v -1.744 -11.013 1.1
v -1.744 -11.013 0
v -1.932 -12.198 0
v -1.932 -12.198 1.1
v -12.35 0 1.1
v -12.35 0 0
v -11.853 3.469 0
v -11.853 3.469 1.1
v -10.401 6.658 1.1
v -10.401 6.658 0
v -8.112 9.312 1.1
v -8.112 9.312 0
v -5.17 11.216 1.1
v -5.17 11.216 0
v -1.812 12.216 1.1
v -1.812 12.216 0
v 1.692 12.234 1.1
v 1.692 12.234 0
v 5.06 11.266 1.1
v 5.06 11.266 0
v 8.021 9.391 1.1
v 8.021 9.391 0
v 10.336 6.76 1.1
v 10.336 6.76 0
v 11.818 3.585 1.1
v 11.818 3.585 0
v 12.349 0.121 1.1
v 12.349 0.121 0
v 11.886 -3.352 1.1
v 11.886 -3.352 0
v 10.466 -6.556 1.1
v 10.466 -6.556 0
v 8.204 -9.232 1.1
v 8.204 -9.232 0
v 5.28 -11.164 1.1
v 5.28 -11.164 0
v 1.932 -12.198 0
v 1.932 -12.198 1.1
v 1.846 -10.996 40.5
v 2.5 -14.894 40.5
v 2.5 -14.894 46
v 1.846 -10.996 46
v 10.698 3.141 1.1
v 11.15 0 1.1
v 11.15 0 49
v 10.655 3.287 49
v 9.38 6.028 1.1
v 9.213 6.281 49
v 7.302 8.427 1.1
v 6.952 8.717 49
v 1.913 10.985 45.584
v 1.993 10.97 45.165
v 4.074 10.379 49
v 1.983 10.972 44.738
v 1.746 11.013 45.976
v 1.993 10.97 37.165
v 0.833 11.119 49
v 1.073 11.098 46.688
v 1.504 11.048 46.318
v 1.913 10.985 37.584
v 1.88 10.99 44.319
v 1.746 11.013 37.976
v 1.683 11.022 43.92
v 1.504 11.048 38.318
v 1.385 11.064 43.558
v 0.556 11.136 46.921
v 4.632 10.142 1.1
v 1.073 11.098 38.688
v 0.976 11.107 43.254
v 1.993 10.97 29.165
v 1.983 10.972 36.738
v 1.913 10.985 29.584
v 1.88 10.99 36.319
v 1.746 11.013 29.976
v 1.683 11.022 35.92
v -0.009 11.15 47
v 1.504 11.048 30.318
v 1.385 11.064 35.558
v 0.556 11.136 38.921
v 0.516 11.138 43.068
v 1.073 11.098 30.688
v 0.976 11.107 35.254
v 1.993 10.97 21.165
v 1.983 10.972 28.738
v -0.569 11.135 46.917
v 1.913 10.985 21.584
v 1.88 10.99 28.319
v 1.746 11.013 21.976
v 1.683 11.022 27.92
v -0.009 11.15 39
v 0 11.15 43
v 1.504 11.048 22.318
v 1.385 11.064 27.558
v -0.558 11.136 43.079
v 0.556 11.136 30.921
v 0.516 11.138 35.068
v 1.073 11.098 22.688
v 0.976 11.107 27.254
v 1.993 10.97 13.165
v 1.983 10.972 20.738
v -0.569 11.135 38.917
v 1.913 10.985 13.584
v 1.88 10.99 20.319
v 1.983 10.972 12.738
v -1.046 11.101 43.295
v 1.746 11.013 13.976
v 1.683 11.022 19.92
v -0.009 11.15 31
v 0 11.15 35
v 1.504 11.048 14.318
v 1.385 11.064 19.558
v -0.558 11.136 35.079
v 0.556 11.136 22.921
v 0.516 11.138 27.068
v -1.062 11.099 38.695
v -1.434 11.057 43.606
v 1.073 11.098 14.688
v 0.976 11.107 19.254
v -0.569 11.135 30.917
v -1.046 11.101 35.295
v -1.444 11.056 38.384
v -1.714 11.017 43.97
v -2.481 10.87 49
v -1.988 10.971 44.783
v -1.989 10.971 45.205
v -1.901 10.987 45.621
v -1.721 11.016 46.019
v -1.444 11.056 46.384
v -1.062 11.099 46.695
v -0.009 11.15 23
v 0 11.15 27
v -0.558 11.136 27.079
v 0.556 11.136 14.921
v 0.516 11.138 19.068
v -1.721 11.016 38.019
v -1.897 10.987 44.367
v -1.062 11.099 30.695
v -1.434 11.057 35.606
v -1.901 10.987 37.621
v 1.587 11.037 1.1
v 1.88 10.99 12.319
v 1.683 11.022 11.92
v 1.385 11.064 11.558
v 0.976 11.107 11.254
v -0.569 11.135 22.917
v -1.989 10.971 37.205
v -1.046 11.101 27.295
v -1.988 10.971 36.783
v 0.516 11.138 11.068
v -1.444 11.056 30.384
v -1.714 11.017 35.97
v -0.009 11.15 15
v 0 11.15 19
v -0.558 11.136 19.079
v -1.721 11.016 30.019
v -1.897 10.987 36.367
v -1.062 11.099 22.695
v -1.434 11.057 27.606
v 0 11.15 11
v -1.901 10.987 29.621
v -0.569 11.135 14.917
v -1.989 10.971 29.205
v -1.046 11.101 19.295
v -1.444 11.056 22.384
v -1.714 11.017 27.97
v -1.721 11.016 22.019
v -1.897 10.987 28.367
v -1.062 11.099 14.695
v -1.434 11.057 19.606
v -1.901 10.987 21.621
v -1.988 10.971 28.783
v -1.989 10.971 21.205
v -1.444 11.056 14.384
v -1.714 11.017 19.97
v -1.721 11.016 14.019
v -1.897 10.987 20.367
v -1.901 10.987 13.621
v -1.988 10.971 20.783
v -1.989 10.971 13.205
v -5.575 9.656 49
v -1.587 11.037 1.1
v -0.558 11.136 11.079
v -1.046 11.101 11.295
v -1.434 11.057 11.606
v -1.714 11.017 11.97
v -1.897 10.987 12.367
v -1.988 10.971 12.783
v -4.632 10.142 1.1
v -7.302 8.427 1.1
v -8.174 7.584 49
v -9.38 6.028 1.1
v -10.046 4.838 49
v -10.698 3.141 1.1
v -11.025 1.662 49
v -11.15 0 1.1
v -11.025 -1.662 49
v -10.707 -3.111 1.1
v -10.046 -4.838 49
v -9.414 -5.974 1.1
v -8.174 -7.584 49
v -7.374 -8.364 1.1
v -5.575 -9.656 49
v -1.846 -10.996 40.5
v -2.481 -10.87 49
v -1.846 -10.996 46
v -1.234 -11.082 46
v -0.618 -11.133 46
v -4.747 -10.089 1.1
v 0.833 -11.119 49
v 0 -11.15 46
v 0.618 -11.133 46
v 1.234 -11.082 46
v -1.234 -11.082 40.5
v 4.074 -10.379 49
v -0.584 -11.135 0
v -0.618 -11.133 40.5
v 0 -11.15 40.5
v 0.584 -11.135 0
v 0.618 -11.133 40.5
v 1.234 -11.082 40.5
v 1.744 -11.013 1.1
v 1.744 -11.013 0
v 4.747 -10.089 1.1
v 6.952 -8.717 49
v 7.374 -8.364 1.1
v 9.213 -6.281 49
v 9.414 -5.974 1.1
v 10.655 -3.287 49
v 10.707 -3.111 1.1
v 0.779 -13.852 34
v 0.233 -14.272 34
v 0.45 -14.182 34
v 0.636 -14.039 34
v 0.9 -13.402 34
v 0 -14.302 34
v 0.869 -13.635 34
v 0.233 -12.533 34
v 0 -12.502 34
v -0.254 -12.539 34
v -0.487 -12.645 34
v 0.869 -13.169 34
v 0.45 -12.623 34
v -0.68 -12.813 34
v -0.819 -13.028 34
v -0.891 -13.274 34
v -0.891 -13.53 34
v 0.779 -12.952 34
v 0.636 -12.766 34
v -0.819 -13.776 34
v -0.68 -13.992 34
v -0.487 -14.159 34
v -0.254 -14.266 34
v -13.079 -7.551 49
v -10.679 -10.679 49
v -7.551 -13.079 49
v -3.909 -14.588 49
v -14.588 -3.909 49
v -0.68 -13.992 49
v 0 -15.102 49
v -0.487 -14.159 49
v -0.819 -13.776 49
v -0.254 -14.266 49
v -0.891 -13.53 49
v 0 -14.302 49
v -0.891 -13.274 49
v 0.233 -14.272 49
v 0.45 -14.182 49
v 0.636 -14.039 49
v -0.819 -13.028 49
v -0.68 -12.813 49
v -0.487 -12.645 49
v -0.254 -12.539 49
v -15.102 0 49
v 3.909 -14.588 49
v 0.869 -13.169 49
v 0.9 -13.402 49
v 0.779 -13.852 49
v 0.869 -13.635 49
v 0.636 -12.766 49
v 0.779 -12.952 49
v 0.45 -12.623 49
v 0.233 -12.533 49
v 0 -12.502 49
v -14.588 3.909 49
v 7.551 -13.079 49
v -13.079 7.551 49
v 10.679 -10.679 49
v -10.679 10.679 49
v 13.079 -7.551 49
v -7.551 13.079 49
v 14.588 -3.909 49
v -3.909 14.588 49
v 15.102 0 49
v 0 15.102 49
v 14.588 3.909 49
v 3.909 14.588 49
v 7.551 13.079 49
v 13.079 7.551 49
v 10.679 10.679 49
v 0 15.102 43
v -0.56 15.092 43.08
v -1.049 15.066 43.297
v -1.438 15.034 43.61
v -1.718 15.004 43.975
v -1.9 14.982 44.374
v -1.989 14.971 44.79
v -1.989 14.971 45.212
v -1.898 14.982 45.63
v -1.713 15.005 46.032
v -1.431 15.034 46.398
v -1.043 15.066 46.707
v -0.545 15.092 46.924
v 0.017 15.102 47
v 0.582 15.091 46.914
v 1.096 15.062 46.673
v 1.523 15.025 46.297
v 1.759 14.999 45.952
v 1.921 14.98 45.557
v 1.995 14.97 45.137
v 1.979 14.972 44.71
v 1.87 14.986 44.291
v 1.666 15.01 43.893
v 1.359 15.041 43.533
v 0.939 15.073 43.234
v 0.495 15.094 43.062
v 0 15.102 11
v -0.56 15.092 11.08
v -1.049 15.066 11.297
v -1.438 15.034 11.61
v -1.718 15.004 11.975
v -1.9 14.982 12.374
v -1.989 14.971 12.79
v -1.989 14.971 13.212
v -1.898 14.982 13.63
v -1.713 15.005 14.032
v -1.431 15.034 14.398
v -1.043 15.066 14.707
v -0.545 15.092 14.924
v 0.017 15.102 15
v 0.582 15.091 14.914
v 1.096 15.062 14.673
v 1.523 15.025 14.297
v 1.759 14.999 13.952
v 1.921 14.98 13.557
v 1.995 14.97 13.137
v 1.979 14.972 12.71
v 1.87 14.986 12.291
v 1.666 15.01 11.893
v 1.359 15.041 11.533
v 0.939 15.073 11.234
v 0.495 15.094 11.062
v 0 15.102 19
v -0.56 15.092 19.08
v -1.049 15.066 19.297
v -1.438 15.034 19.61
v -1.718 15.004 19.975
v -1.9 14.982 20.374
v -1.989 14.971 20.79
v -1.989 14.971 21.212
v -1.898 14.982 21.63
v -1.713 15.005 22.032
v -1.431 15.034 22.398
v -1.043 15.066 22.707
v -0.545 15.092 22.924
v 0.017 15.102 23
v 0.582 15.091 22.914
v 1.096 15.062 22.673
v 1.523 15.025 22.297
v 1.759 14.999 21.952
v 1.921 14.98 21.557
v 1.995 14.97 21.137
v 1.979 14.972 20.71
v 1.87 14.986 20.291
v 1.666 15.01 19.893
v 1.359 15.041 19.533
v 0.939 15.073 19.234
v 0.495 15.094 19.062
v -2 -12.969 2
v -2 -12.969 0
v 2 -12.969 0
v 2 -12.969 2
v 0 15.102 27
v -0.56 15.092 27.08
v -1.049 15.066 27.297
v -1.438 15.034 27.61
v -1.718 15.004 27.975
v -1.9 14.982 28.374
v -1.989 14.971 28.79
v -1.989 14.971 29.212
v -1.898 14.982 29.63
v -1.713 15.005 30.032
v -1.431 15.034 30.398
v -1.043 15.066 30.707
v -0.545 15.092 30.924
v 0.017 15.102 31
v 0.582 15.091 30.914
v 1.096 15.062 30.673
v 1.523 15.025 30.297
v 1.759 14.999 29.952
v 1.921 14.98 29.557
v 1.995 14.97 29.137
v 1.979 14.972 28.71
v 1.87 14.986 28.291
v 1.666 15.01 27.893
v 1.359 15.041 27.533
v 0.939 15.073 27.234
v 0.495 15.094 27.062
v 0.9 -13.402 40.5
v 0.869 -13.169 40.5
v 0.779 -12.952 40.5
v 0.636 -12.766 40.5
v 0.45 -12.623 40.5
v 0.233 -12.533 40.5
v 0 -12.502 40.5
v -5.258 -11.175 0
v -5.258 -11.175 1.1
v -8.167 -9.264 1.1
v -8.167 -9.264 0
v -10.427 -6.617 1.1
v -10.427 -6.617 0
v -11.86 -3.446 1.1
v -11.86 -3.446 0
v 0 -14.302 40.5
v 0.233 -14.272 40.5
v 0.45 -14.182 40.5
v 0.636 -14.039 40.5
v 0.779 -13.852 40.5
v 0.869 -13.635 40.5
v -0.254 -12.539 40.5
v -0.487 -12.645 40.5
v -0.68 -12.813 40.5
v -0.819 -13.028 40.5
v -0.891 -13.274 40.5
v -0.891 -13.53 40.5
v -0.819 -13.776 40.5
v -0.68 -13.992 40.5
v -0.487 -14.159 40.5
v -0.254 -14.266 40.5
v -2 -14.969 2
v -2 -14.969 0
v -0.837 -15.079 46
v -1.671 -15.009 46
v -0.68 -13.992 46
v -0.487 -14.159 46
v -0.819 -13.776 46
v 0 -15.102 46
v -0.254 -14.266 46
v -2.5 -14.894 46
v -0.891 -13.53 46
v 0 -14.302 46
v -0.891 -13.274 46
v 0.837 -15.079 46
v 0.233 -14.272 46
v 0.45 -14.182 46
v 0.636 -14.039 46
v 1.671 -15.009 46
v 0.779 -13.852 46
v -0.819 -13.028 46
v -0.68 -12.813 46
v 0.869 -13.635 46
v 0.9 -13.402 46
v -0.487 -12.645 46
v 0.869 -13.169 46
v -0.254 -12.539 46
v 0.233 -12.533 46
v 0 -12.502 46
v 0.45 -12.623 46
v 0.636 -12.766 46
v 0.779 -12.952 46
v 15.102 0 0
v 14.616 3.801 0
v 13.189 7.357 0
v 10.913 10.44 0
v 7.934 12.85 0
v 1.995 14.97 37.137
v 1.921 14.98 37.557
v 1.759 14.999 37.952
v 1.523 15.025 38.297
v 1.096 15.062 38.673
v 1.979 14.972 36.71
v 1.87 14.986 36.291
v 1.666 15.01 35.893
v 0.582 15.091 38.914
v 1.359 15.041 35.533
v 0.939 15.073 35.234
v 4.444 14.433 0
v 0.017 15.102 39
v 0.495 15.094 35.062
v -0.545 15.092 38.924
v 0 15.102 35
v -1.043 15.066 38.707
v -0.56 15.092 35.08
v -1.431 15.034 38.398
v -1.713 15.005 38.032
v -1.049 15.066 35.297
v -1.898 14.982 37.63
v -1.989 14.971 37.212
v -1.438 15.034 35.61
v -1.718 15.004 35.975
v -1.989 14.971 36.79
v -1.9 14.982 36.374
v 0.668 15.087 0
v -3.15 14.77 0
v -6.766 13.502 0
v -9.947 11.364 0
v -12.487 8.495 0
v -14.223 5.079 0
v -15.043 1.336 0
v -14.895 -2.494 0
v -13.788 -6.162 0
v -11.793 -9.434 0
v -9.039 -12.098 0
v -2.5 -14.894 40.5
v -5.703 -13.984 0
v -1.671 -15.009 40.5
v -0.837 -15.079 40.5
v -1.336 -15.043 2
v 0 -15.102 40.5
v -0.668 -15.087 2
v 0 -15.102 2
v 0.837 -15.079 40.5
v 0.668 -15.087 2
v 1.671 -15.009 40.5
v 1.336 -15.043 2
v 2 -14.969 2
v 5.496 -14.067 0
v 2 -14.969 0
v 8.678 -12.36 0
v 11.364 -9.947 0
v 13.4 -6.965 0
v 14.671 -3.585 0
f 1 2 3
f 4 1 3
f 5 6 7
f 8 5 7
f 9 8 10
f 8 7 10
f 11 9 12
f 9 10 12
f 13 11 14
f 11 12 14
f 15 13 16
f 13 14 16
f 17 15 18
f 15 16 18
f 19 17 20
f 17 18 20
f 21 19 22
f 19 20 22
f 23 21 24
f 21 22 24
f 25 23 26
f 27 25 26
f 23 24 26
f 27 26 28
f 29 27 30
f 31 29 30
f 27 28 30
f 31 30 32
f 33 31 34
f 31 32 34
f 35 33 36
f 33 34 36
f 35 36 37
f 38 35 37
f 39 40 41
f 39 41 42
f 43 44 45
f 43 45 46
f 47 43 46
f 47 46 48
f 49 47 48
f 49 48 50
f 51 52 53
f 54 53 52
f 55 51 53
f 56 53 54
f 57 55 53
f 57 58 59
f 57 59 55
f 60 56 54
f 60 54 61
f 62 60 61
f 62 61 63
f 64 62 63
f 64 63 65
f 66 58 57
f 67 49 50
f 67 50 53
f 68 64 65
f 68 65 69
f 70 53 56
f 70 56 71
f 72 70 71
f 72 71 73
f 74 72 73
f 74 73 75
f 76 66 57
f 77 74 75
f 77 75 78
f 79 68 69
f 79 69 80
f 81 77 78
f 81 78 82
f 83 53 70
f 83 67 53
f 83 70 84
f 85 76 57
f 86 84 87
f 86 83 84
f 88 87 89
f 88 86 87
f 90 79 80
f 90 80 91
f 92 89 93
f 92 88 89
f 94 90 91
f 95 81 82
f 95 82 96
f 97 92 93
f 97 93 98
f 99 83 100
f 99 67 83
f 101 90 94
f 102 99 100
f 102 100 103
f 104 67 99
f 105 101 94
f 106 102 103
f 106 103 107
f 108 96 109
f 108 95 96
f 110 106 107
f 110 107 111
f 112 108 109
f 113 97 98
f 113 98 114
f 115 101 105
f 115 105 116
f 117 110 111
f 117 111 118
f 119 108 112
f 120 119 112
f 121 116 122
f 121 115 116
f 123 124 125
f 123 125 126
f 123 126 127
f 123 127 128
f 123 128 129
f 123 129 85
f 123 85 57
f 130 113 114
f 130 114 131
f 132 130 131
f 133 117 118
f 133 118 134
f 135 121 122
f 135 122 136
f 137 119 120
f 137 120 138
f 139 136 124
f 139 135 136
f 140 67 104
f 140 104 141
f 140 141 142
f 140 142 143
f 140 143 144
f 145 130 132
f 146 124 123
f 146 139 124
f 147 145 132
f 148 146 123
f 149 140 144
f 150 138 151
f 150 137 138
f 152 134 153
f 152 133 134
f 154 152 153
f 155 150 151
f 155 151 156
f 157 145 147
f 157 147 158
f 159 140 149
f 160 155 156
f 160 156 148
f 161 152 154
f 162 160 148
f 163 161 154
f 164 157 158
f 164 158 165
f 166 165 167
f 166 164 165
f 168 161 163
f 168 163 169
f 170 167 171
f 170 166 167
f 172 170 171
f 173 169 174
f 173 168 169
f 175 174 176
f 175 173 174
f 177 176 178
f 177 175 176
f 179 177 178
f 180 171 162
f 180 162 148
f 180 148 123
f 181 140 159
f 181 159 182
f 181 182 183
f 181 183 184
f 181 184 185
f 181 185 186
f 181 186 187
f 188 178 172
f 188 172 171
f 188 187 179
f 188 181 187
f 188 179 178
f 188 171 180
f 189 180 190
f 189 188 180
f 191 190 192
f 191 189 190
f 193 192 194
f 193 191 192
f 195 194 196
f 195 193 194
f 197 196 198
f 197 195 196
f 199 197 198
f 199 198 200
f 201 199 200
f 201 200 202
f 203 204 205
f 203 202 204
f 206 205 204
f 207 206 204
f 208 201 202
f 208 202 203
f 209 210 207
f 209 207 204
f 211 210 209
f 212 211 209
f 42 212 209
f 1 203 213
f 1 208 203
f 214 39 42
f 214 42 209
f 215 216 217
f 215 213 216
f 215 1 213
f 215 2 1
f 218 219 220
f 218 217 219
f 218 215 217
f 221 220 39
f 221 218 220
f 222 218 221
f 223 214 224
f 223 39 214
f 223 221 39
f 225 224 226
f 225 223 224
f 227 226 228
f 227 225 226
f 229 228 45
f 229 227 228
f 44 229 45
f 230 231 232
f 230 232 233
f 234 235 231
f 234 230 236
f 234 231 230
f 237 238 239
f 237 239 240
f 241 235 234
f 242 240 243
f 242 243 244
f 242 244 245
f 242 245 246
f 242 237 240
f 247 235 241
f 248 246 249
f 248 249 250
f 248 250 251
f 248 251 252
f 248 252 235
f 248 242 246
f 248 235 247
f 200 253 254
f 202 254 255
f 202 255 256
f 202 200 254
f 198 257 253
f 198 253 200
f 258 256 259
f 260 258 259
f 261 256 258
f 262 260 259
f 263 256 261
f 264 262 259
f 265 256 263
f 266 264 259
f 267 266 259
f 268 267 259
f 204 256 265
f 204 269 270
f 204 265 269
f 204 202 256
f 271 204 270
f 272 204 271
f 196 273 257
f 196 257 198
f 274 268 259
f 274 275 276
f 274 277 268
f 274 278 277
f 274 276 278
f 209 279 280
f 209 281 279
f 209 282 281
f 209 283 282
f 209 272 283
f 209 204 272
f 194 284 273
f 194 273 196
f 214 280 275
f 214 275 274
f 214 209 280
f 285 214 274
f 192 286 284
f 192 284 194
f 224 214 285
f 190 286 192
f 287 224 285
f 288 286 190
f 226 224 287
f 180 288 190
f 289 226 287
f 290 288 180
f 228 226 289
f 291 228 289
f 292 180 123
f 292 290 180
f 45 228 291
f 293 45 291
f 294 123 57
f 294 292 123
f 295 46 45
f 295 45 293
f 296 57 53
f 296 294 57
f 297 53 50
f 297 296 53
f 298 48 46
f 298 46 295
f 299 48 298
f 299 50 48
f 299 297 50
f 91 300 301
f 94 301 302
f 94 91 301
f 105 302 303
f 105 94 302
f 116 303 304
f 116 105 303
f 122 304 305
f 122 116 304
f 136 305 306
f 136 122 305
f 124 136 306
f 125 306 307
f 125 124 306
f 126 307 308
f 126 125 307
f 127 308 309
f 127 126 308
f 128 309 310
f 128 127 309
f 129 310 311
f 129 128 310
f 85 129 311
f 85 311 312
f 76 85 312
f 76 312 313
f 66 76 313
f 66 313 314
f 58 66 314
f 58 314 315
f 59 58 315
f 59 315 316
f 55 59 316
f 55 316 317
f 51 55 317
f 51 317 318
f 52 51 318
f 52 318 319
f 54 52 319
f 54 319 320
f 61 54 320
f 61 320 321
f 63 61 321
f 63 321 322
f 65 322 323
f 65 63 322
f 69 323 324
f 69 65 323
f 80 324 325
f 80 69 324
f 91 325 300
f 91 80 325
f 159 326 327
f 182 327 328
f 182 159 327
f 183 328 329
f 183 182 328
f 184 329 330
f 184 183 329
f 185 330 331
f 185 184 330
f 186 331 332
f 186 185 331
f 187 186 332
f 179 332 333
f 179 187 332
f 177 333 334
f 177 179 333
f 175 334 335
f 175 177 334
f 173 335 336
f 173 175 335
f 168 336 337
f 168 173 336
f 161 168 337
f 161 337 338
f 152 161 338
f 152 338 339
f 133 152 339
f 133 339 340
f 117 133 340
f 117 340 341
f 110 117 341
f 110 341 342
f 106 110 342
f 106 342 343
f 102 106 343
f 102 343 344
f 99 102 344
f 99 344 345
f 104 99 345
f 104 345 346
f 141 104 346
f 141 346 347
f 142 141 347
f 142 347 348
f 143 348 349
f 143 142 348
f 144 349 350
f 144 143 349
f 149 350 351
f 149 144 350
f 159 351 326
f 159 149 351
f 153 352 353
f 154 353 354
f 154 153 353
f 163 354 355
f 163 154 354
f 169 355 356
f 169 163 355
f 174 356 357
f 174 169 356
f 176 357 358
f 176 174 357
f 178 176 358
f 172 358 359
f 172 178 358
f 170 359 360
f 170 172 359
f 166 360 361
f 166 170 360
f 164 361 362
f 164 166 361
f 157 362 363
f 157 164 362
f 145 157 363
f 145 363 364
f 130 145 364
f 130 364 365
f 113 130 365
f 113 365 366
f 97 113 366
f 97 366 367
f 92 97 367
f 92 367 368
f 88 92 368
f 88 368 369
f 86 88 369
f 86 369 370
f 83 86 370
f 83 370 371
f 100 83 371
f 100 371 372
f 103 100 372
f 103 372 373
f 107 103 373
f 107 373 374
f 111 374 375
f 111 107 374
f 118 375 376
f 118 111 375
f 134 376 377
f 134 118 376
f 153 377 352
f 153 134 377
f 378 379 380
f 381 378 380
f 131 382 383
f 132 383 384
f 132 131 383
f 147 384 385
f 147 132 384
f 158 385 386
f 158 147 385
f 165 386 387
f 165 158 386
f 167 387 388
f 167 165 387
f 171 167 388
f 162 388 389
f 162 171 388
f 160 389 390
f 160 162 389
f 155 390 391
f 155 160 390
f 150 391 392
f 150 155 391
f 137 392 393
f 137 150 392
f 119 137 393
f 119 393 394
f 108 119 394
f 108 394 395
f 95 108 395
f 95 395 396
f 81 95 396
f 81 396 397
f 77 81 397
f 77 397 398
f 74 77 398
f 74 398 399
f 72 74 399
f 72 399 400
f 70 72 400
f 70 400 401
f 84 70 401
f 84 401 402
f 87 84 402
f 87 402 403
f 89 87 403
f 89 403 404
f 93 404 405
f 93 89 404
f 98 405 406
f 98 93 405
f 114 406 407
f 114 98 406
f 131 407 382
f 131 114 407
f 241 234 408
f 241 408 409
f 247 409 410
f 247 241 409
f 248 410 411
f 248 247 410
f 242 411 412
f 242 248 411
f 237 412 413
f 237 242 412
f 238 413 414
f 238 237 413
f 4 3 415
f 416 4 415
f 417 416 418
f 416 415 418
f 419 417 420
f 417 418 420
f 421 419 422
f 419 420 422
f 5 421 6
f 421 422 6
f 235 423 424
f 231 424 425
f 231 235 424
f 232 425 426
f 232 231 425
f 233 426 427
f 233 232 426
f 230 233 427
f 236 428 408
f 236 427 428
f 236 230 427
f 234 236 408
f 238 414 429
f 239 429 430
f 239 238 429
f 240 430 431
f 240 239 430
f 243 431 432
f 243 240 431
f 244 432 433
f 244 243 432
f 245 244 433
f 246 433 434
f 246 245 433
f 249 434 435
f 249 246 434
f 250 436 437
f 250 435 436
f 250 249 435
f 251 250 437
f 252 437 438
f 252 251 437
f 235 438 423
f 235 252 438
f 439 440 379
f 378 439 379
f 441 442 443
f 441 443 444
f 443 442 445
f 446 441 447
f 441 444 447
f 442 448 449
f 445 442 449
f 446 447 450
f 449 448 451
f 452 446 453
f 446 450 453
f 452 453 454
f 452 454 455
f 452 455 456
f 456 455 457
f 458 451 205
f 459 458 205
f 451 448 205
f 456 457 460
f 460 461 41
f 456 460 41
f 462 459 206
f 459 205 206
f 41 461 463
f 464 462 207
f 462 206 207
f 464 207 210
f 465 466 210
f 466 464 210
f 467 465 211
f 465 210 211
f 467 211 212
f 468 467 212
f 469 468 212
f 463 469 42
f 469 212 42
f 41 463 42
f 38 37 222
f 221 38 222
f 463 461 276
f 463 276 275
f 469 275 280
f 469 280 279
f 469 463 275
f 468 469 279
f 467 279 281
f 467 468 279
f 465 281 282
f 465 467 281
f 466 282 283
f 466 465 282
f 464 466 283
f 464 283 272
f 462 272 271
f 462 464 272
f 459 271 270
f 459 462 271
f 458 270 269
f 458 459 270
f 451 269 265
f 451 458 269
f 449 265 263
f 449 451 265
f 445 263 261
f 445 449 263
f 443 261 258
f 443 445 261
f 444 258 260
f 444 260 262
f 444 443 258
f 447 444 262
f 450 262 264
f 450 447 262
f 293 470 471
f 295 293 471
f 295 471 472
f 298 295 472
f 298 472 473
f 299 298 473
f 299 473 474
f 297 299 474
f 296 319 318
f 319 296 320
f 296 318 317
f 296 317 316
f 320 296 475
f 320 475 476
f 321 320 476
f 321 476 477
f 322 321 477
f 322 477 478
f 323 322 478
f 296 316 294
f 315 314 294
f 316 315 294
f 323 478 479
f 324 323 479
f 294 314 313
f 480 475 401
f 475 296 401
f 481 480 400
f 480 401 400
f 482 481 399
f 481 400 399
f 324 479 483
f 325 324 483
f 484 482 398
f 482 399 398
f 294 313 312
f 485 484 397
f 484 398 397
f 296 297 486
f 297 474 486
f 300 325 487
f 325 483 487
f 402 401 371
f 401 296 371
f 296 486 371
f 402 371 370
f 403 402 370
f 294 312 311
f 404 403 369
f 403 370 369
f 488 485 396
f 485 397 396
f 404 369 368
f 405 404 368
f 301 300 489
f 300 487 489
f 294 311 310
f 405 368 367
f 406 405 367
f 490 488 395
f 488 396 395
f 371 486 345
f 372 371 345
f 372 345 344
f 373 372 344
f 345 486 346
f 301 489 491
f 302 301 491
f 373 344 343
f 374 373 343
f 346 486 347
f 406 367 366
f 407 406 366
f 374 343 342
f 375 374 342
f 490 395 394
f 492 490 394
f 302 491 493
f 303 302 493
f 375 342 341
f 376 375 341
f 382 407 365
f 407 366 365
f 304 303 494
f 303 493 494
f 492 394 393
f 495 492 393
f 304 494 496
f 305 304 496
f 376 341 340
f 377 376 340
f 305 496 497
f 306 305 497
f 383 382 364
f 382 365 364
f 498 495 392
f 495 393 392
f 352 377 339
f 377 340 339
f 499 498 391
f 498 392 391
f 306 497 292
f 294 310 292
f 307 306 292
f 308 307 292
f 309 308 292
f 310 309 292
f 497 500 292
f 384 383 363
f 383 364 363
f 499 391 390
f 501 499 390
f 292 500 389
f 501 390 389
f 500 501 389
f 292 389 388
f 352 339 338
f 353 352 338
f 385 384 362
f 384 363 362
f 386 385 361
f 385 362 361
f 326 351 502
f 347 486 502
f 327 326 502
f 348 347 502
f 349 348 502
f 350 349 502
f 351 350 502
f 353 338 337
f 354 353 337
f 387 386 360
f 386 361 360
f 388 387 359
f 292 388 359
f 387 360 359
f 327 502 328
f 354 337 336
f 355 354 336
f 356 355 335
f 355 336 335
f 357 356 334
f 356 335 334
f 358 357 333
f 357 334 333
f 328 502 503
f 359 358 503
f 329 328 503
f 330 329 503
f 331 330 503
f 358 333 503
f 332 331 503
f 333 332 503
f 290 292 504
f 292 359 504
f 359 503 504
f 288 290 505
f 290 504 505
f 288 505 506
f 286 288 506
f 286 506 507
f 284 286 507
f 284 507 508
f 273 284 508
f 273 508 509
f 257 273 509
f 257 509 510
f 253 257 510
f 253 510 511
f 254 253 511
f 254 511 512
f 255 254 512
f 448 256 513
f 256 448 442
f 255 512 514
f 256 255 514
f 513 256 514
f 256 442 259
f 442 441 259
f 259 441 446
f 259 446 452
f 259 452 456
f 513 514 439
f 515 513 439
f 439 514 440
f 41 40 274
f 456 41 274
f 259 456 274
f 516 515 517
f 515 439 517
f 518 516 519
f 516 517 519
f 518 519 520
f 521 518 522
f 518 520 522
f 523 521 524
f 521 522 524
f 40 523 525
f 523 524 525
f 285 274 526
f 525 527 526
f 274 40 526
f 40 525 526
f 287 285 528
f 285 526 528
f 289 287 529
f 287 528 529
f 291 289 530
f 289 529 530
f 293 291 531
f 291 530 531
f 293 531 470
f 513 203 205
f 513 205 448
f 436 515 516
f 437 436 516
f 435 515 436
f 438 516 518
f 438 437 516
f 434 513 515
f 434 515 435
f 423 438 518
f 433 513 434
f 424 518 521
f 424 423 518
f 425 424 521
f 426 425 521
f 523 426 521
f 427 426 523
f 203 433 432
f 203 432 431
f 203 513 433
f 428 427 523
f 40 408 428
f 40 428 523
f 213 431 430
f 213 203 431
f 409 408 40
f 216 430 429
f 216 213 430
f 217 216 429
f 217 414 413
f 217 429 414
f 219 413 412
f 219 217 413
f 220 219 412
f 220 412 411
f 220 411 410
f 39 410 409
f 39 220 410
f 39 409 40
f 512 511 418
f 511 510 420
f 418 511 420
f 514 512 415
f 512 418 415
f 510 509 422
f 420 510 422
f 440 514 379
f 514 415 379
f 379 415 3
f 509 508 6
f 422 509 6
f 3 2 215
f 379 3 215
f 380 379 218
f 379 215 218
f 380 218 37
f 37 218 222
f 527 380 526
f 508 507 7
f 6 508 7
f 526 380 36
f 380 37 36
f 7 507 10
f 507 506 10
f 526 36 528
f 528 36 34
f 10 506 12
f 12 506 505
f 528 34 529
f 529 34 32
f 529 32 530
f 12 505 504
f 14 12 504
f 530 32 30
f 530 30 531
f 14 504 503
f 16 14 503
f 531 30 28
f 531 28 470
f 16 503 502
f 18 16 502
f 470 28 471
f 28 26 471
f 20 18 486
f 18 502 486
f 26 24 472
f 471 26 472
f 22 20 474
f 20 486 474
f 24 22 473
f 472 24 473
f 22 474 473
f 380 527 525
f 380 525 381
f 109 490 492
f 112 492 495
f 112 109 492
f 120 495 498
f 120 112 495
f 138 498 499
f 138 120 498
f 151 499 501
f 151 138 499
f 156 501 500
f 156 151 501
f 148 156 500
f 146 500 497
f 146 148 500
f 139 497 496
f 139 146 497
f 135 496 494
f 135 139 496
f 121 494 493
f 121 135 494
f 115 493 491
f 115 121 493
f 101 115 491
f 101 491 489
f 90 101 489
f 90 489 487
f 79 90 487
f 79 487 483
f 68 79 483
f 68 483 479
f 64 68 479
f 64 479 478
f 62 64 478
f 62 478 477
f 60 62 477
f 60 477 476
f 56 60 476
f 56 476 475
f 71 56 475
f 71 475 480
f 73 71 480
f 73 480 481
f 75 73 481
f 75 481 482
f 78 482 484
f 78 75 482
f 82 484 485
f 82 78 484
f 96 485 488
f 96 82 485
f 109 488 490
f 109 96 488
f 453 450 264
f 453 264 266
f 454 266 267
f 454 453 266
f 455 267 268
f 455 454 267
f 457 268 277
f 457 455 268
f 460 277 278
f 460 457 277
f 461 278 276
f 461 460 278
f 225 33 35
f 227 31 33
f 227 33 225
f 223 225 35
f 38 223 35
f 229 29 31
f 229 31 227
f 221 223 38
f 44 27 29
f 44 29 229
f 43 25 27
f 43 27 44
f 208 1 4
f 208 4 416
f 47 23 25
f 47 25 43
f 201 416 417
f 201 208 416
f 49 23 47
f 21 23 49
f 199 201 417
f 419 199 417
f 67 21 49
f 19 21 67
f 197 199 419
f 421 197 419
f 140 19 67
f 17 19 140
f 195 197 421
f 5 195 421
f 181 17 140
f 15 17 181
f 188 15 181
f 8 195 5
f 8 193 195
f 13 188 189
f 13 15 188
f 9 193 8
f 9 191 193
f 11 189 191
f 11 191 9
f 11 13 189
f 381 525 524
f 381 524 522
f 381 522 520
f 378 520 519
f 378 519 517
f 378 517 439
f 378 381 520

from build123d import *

# Parameters (mm, degrees)
SKETCH1_R           = 15.102178337
SKETCH1_R_2         = 11.15
BOSS_EXTRUDE1_DEPTH = 49
SKETCH2_W           = 2
SKETCH2_H           = 2
CUT_EXTRUDE1_DEPTH  = 2
CUT_EXTRUDE2_DEPTH  = 1.1
SKETCH7_R           = 2
PIN_HOLE_DEPTH      = 54.452329987
CUT_EXTRUDE4_START  = -8.5
CUT_EXTRUDE4_DEPTH  = 5.5
CUT_EXTRUDE5_START  = -15
CUT_EXTRUDE5_DEPTH  = 15


with BuildPart() as part:
    # Sketch1 → Boss-Extrude1 (new body)
    with BuildSketch(Plane.XY):
        Circle(SKETCH1_R)
        Circle(SKETCH1_R_2, mode=Mode.SUBTRACT)
    extrude(amount=BOSS_EXTRUDE1_DEPTH)

    # Sketch2 → Cut-Extrude1 (cut)
    with BuildSketch(Plane(origin=(0, 0, 0), x_dir=(-1, 0, 0), z_dir=(0, 0, -1))):
        with BuildLine():
            Line((2, -14.969161317), (0, -14.969161317))
            Line((0, -14.969161317), (0, -15.102178337))
            ThreePointArc((0, -15.102178337), (1.002209251, -15.068887389), (2, -14.969161317))
        make_face()
        with BuildLine():
            Line((0, -15.102178337), (0, -14.969161317))
            Line((0, -14.969161317), (-2, -14.969161317))
            ThreePointArc((-2, -14.969161317), (-1.002209251, -15.068887389), (0, -15.102178337))
        make_face()
        with Locations((1, -13.969161317)):
            Rectangle(SKETCH2_W, SKETCH2_H)
        with Locations((-1, -13.969161317)):
            Rectangle(SKETCH2_W, SKETCH2_H)
    extrude(amount=-CUT_EXTRUDE1_DEPTH, mode=Mode.SUBTRACT)

    # Sketch6 → Cut-Extrude2 (cut)
    with BuildSketch(Plane(origin=(0, 0, 0), x_dir=(-1, 0, 0), z_dir=(0, 0, -1))):
        with BuildLine():
            Line((-1.931965643, -12.197951006), (-1.744244285, -11.012724998))
            ThreePointArc((-1.744244285, -11.012724998), (-7.241345739, 8.478526516), (11.15, 0))
            ThreePointArc((11.15, 0), (8.478526516, -7.241345739), (1.744244285, -11.012724998))
            Line((1.744244285, -11.012724998), (1.931965643, -12.197951006))
            ThreePointArc((1.931965643, -12.197951006), (9.391013675, -8.020683397), (12.35, 0))
            ThreePointArc((12.35, 0), (-8.020683397, 9.391013675), (-1.931965643, -12.197951006))
        make_face()
    extrude(amount=-CUT_EXTRUDE2_DEPTH, mode=Mode.SUBTRACT)

    # Sketch7 → Pin hole (cut, through all)
    with BuildSketch(Plane(origin=(0, 0, 0), x_dir=(1, 0, 0), z_dir=(0, 1, 0))):
        with Locations(Location((0, -13, 0), (0, 0, 90))):
            Circle(SKETCH7_R)
        with Locations(Location((0, -21, 0), (0, 0, 90))):
            Circle(SKETCH7_R)
        with Locations(Location((0, -29, 0), (0, 0, 90))):
            Circle(SKETCH7_R)
        with Locations(Location((0, -37, 0), (0, 0, 90))):
            Circle(SKETCH7_R)
        with Locations(Location((0, -45, 0), (0, 0, 90))):
            Circle(SKETCH7_R)
    extrude(amount=PIN_HOLE_DEPTH, mode=Mode.SUBTRACT)

    # Sketch8 → Cut-Extrude4 (cut)
    with BuildSketch(Plane.XY.offset(49).offset(CUT_EXTRUDE4_START)):
        with BuildLine():
            Line((2.5, -14.893817192), (1.845760219, -10.996166114))
            ThreePointArc((1.845760219, -10.996166114), (0.926079863, -11.111474974), (0, -11.15))
            Line((0, -11.15), (0, -12.502178337))
            ThreePointArc((0, -12.502178337), (0.636396103, -12.765782234), (0.9, -13.402178337))
            ThreePointArc((0.9, -13.402178337), (0.636396103, -14.038574441), (0, -14.302178337))
            Line((0, -14.302178337), (0, -15.102178337))
            ThreePointArc((0, -15.102178337), (1.254333924, -15.049997905), (2.5, -14.893817192))
        make_face()
        with BuildLine():
            ThreePointArc((0, -11.15), (-0.926079863, -11.111474974), (-1.845760219, -10.996166114))
            Line((-1.845760219, -10.996166114), (-2.5, -14.893817192))
            ThreePointArc((-2.5, -14.893817192), (-1.254333924, -15.049997905), (0, -15.102178337))
            Line((0, -15.102178337), (0, -14.302178337))
            ThreePointArc((0, -14.302178337), (-0.9, -13.402178337), (0, -12.502178337))
            Line((0, -12.502178337), (0, -11.15))
        make_face()
    extrude(amount=CUT_EXTRUDE4_DEPTH, mode=Mode.SUBTRACT)

    # Sketch8<3> → Cut-Extrude5 (cut)
    with BuildSketch(Plane.XY.offset(49).offset(CUT_EXTRUDE5_START)):
        with BuildLine():
            ThreePointArc((0.9, -13.402178337), (0.636396103, -12.765782234), (0, -12.502178337))
            Line((0, -12.502178337), (0, -14.302178337))
            ThreePointArc((0, -14.302178337), (0.636396103, -14.038574441), (0.9, -13.402178337))
        make_face()
        with BuildLine():
            Line((0, -14.302178337), (0, -12.502178337))
            ThreePointArc((0, -12.502178337), (-0.9, -13.402178337), (0, -14.302178337))
        make_face()
    extrude(amount=CUT_EXTRUDE5_DEPTH, mode=Mode.SUBTRACT)


solid = part.part
